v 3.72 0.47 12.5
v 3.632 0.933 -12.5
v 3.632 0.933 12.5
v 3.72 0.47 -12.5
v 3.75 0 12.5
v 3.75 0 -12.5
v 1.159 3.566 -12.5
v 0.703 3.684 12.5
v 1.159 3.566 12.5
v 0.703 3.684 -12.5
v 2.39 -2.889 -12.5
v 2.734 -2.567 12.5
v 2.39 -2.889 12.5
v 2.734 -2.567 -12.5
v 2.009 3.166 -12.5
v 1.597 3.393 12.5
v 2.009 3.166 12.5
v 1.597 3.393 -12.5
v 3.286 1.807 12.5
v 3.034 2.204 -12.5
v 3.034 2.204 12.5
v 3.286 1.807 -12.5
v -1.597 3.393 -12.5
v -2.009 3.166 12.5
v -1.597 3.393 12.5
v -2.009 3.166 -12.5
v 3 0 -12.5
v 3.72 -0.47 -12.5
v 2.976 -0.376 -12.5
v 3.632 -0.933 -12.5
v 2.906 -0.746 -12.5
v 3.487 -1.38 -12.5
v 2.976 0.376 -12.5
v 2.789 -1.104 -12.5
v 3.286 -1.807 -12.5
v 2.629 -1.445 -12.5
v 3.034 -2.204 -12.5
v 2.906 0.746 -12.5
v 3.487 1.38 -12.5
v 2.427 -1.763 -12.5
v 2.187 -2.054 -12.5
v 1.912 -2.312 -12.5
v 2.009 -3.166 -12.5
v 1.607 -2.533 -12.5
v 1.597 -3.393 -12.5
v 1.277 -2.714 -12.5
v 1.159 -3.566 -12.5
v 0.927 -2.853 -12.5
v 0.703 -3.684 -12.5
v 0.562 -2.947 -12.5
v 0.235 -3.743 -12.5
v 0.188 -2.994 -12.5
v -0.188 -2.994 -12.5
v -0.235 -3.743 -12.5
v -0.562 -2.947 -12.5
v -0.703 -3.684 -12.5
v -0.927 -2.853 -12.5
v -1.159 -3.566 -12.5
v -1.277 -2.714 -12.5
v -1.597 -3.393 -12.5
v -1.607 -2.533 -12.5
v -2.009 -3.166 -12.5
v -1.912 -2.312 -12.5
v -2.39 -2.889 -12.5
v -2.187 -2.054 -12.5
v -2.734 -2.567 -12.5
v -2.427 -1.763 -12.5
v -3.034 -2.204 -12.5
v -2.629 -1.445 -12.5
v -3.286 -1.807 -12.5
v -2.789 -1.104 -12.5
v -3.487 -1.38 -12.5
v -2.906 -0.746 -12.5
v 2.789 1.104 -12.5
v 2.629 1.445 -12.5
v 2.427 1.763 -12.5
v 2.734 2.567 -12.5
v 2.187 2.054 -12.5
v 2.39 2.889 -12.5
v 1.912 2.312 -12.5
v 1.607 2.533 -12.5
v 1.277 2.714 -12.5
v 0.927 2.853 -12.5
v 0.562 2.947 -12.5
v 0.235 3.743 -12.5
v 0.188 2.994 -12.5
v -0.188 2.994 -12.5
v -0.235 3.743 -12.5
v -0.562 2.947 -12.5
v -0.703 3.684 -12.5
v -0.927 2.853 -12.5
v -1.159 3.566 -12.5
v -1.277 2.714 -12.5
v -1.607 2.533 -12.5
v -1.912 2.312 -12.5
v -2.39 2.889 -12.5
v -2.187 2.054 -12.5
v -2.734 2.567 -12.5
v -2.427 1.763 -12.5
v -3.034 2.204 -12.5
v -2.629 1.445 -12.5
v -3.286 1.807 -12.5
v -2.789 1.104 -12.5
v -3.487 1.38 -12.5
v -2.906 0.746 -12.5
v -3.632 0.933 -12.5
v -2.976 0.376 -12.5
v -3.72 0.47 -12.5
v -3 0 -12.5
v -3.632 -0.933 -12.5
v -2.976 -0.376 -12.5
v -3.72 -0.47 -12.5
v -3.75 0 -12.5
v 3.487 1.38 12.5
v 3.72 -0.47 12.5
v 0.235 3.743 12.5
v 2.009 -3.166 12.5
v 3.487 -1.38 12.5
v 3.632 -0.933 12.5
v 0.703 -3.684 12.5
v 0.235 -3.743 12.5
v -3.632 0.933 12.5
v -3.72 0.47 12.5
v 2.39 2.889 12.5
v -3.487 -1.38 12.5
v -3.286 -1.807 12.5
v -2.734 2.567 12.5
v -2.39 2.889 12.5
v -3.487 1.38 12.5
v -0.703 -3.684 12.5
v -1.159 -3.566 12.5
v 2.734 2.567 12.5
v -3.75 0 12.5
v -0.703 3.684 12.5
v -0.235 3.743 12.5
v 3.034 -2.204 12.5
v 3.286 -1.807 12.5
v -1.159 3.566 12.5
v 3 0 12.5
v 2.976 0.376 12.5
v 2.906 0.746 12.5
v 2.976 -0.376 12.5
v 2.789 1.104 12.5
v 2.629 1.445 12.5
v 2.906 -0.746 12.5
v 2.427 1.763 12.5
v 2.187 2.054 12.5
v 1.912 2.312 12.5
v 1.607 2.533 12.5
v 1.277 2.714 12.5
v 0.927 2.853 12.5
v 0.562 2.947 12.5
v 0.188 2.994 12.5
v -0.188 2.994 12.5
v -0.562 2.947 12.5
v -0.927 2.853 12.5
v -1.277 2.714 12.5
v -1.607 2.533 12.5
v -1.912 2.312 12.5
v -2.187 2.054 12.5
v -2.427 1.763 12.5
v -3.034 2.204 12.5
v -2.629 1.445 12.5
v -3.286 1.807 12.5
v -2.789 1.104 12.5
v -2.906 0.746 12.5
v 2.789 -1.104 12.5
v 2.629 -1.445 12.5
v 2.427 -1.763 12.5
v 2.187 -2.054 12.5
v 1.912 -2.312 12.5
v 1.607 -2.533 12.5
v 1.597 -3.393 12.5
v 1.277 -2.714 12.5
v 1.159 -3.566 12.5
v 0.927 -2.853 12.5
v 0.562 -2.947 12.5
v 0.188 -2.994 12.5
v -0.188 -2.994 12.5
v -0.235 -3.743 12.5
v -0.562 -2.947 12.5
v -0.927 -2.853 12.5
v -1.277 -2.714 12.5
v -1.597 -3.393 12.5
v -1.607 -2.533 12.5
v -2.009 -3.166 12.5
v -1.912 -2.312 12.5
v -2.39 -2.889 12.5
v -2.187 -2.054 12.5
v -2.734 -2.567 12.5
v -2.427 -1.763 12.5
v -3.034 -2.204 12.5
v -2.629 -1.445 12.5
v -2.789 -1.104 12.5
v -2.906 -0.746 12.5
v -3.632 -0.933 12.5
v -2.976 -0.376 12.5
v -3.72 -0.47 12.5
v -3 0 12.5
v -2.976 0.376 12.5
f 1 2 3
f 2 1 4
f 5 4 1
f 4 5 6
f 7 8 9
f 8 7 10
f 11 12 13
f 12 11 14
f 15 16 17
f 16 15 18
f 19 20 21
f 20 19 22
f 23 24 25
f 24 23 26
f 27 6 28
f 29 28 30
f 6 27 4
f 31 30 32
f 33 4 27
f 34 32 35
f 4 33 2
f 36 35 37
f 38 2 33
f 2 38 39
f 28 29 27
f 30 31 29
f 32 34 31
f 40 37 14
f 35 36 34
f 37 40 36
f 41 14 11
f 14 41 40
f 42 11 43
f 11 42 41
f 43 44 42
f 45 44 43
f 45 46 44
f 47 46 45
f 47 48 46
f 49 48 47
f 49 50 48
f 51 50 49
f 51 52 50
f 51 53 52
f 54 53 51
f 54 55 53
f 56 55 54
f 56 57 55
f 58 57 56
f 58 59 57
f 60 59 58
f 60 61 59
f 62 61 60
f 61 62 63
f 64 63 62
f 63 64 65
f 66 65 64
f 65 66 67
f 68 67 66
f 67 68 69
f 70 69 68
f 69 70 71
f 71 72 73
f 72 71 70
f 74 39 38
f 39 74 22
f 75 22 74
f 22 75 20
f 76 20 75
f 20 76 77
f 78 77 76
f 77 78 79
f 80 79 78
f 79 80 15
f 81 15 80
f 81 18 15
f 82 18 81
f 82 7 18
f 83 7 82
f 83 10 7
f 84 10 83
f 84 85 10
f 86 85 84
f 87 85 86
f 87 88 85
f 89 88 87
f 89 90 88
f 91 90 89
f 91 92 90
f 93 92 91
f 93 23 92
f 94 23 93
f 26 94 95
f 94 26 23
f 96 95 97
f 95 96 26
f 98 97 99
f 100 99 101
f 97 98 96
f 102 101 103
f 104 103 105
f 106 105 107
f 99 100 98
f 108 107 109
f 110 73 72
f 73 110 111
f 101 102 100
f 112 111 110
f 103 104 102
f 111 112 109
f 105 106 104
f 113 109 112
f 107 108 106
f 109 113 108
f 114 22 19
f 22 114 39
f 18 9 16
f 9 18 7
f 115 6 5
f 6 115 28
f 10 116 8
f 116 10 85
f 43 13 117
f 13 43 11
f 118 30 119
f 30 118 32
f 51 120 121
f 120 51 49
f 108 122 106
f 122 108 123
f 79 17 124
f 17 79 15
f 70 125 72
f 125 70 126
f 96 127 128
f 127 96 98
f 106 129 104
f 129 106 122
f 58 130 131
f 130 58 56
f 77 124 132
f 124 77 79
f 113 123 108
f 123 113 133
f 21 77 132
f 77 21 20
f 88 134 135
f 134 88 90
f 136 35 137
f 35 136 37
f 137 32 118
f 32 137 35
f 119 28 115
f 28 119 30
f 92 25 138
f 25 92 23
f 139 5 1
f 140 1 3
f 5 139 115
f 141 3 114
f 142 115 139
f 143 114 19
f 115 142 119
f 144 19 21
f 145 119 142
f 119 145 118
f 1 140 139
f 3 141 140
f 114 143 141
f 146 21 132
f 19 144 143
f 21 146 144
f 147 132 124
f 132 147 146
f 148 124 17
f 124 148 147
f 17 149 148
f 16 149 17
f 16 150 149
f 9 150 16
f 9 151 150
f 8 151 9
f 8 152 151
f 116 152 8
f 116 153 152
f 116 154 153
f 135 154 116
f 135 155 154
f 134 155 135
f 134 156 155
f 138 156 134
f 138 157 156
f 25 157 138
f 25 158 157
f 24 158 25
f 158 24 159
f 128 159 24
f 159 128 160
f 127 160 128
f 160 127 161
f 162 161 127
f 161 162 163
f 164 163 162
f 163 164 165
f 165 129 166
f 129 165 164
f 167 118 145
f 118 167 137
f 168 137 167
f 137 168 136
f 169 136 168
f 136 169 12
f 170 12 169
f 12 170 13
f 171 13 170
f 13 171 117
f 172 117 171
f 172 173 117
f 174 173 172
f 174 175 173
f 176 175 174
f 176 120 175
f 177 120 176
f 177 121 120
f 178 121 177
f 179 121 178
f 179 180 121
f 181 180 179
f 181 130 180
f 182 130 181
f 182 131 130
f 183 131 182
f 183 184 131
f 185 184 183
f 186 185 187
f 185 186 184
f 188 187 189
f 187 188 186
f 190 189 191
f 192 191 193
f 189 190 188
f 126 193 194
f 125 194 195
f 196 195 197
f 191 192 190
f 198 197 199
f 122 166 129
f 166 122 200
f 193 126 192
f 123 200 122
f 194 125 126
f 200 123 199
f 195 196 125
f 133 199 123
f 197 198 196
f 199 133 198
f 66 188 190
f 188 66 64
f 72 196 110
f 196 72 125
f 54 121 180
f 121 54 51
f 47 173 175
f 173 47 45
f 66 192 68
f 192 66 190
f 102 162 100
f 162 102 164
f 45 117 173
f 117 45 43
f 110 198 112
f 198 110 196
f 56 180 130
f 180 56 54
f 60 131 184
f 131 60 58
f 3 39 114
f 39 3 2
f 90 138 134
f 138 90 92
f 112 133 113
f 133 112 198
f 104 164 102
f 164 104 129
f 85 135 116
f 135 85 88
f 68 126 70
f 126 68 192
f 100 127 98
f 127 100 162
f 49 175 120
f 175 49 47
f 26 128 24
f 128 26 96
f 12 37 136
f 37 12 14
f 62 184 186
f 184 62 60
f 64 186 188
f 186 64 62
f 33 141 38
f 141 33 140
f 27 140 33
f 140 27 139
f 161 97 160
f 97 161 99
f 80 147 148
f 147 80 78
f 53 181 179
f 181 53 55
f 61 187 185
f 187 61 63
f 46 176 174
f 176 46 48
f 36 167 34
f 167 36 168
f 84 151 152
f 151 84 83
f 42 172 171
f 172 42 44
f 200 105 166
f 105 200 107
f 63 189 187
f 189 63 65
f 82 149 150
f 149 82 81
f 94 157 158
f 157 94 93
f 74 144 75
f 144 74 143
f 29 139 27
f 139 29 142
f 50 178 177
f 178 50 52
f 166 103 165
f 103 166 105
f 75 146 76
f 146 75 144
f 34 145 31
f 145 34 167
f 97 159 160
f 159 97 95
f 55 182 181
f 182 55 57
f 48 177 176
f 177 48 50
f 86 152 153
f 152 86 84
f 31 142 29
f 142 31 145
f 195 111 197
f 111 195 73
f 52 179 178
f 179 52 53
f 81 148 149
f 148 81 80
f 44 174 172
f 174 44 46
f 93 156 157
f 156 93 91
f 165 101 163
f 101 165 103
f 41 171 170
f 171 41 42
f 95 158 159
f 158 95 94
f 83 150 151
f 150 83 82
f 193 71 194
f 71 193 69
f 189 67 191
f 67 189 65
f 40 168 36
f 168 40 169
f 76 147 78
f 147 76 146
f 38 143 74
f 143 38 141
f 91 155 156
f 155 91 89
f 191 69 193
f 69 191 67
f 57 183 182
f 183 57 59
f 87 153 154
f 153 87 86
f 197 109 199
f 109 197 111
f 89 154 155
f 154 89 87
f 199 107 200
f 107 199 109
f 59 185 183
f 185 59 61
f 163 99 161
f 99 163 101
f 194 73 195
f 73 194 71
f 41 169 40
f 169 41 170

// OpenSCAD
$fn = 50;


difference() {
	union() {
		translate(v = [0, 0, -12.5000000000]) {
			cylinder(h = 25, r = 3.7500000000);
		}
	}
	union() {
		translate(v = [0, 0, -100.0000000000]) {
			cylinder(h = 200, r = 3.0000000000);
		}
	}
}
